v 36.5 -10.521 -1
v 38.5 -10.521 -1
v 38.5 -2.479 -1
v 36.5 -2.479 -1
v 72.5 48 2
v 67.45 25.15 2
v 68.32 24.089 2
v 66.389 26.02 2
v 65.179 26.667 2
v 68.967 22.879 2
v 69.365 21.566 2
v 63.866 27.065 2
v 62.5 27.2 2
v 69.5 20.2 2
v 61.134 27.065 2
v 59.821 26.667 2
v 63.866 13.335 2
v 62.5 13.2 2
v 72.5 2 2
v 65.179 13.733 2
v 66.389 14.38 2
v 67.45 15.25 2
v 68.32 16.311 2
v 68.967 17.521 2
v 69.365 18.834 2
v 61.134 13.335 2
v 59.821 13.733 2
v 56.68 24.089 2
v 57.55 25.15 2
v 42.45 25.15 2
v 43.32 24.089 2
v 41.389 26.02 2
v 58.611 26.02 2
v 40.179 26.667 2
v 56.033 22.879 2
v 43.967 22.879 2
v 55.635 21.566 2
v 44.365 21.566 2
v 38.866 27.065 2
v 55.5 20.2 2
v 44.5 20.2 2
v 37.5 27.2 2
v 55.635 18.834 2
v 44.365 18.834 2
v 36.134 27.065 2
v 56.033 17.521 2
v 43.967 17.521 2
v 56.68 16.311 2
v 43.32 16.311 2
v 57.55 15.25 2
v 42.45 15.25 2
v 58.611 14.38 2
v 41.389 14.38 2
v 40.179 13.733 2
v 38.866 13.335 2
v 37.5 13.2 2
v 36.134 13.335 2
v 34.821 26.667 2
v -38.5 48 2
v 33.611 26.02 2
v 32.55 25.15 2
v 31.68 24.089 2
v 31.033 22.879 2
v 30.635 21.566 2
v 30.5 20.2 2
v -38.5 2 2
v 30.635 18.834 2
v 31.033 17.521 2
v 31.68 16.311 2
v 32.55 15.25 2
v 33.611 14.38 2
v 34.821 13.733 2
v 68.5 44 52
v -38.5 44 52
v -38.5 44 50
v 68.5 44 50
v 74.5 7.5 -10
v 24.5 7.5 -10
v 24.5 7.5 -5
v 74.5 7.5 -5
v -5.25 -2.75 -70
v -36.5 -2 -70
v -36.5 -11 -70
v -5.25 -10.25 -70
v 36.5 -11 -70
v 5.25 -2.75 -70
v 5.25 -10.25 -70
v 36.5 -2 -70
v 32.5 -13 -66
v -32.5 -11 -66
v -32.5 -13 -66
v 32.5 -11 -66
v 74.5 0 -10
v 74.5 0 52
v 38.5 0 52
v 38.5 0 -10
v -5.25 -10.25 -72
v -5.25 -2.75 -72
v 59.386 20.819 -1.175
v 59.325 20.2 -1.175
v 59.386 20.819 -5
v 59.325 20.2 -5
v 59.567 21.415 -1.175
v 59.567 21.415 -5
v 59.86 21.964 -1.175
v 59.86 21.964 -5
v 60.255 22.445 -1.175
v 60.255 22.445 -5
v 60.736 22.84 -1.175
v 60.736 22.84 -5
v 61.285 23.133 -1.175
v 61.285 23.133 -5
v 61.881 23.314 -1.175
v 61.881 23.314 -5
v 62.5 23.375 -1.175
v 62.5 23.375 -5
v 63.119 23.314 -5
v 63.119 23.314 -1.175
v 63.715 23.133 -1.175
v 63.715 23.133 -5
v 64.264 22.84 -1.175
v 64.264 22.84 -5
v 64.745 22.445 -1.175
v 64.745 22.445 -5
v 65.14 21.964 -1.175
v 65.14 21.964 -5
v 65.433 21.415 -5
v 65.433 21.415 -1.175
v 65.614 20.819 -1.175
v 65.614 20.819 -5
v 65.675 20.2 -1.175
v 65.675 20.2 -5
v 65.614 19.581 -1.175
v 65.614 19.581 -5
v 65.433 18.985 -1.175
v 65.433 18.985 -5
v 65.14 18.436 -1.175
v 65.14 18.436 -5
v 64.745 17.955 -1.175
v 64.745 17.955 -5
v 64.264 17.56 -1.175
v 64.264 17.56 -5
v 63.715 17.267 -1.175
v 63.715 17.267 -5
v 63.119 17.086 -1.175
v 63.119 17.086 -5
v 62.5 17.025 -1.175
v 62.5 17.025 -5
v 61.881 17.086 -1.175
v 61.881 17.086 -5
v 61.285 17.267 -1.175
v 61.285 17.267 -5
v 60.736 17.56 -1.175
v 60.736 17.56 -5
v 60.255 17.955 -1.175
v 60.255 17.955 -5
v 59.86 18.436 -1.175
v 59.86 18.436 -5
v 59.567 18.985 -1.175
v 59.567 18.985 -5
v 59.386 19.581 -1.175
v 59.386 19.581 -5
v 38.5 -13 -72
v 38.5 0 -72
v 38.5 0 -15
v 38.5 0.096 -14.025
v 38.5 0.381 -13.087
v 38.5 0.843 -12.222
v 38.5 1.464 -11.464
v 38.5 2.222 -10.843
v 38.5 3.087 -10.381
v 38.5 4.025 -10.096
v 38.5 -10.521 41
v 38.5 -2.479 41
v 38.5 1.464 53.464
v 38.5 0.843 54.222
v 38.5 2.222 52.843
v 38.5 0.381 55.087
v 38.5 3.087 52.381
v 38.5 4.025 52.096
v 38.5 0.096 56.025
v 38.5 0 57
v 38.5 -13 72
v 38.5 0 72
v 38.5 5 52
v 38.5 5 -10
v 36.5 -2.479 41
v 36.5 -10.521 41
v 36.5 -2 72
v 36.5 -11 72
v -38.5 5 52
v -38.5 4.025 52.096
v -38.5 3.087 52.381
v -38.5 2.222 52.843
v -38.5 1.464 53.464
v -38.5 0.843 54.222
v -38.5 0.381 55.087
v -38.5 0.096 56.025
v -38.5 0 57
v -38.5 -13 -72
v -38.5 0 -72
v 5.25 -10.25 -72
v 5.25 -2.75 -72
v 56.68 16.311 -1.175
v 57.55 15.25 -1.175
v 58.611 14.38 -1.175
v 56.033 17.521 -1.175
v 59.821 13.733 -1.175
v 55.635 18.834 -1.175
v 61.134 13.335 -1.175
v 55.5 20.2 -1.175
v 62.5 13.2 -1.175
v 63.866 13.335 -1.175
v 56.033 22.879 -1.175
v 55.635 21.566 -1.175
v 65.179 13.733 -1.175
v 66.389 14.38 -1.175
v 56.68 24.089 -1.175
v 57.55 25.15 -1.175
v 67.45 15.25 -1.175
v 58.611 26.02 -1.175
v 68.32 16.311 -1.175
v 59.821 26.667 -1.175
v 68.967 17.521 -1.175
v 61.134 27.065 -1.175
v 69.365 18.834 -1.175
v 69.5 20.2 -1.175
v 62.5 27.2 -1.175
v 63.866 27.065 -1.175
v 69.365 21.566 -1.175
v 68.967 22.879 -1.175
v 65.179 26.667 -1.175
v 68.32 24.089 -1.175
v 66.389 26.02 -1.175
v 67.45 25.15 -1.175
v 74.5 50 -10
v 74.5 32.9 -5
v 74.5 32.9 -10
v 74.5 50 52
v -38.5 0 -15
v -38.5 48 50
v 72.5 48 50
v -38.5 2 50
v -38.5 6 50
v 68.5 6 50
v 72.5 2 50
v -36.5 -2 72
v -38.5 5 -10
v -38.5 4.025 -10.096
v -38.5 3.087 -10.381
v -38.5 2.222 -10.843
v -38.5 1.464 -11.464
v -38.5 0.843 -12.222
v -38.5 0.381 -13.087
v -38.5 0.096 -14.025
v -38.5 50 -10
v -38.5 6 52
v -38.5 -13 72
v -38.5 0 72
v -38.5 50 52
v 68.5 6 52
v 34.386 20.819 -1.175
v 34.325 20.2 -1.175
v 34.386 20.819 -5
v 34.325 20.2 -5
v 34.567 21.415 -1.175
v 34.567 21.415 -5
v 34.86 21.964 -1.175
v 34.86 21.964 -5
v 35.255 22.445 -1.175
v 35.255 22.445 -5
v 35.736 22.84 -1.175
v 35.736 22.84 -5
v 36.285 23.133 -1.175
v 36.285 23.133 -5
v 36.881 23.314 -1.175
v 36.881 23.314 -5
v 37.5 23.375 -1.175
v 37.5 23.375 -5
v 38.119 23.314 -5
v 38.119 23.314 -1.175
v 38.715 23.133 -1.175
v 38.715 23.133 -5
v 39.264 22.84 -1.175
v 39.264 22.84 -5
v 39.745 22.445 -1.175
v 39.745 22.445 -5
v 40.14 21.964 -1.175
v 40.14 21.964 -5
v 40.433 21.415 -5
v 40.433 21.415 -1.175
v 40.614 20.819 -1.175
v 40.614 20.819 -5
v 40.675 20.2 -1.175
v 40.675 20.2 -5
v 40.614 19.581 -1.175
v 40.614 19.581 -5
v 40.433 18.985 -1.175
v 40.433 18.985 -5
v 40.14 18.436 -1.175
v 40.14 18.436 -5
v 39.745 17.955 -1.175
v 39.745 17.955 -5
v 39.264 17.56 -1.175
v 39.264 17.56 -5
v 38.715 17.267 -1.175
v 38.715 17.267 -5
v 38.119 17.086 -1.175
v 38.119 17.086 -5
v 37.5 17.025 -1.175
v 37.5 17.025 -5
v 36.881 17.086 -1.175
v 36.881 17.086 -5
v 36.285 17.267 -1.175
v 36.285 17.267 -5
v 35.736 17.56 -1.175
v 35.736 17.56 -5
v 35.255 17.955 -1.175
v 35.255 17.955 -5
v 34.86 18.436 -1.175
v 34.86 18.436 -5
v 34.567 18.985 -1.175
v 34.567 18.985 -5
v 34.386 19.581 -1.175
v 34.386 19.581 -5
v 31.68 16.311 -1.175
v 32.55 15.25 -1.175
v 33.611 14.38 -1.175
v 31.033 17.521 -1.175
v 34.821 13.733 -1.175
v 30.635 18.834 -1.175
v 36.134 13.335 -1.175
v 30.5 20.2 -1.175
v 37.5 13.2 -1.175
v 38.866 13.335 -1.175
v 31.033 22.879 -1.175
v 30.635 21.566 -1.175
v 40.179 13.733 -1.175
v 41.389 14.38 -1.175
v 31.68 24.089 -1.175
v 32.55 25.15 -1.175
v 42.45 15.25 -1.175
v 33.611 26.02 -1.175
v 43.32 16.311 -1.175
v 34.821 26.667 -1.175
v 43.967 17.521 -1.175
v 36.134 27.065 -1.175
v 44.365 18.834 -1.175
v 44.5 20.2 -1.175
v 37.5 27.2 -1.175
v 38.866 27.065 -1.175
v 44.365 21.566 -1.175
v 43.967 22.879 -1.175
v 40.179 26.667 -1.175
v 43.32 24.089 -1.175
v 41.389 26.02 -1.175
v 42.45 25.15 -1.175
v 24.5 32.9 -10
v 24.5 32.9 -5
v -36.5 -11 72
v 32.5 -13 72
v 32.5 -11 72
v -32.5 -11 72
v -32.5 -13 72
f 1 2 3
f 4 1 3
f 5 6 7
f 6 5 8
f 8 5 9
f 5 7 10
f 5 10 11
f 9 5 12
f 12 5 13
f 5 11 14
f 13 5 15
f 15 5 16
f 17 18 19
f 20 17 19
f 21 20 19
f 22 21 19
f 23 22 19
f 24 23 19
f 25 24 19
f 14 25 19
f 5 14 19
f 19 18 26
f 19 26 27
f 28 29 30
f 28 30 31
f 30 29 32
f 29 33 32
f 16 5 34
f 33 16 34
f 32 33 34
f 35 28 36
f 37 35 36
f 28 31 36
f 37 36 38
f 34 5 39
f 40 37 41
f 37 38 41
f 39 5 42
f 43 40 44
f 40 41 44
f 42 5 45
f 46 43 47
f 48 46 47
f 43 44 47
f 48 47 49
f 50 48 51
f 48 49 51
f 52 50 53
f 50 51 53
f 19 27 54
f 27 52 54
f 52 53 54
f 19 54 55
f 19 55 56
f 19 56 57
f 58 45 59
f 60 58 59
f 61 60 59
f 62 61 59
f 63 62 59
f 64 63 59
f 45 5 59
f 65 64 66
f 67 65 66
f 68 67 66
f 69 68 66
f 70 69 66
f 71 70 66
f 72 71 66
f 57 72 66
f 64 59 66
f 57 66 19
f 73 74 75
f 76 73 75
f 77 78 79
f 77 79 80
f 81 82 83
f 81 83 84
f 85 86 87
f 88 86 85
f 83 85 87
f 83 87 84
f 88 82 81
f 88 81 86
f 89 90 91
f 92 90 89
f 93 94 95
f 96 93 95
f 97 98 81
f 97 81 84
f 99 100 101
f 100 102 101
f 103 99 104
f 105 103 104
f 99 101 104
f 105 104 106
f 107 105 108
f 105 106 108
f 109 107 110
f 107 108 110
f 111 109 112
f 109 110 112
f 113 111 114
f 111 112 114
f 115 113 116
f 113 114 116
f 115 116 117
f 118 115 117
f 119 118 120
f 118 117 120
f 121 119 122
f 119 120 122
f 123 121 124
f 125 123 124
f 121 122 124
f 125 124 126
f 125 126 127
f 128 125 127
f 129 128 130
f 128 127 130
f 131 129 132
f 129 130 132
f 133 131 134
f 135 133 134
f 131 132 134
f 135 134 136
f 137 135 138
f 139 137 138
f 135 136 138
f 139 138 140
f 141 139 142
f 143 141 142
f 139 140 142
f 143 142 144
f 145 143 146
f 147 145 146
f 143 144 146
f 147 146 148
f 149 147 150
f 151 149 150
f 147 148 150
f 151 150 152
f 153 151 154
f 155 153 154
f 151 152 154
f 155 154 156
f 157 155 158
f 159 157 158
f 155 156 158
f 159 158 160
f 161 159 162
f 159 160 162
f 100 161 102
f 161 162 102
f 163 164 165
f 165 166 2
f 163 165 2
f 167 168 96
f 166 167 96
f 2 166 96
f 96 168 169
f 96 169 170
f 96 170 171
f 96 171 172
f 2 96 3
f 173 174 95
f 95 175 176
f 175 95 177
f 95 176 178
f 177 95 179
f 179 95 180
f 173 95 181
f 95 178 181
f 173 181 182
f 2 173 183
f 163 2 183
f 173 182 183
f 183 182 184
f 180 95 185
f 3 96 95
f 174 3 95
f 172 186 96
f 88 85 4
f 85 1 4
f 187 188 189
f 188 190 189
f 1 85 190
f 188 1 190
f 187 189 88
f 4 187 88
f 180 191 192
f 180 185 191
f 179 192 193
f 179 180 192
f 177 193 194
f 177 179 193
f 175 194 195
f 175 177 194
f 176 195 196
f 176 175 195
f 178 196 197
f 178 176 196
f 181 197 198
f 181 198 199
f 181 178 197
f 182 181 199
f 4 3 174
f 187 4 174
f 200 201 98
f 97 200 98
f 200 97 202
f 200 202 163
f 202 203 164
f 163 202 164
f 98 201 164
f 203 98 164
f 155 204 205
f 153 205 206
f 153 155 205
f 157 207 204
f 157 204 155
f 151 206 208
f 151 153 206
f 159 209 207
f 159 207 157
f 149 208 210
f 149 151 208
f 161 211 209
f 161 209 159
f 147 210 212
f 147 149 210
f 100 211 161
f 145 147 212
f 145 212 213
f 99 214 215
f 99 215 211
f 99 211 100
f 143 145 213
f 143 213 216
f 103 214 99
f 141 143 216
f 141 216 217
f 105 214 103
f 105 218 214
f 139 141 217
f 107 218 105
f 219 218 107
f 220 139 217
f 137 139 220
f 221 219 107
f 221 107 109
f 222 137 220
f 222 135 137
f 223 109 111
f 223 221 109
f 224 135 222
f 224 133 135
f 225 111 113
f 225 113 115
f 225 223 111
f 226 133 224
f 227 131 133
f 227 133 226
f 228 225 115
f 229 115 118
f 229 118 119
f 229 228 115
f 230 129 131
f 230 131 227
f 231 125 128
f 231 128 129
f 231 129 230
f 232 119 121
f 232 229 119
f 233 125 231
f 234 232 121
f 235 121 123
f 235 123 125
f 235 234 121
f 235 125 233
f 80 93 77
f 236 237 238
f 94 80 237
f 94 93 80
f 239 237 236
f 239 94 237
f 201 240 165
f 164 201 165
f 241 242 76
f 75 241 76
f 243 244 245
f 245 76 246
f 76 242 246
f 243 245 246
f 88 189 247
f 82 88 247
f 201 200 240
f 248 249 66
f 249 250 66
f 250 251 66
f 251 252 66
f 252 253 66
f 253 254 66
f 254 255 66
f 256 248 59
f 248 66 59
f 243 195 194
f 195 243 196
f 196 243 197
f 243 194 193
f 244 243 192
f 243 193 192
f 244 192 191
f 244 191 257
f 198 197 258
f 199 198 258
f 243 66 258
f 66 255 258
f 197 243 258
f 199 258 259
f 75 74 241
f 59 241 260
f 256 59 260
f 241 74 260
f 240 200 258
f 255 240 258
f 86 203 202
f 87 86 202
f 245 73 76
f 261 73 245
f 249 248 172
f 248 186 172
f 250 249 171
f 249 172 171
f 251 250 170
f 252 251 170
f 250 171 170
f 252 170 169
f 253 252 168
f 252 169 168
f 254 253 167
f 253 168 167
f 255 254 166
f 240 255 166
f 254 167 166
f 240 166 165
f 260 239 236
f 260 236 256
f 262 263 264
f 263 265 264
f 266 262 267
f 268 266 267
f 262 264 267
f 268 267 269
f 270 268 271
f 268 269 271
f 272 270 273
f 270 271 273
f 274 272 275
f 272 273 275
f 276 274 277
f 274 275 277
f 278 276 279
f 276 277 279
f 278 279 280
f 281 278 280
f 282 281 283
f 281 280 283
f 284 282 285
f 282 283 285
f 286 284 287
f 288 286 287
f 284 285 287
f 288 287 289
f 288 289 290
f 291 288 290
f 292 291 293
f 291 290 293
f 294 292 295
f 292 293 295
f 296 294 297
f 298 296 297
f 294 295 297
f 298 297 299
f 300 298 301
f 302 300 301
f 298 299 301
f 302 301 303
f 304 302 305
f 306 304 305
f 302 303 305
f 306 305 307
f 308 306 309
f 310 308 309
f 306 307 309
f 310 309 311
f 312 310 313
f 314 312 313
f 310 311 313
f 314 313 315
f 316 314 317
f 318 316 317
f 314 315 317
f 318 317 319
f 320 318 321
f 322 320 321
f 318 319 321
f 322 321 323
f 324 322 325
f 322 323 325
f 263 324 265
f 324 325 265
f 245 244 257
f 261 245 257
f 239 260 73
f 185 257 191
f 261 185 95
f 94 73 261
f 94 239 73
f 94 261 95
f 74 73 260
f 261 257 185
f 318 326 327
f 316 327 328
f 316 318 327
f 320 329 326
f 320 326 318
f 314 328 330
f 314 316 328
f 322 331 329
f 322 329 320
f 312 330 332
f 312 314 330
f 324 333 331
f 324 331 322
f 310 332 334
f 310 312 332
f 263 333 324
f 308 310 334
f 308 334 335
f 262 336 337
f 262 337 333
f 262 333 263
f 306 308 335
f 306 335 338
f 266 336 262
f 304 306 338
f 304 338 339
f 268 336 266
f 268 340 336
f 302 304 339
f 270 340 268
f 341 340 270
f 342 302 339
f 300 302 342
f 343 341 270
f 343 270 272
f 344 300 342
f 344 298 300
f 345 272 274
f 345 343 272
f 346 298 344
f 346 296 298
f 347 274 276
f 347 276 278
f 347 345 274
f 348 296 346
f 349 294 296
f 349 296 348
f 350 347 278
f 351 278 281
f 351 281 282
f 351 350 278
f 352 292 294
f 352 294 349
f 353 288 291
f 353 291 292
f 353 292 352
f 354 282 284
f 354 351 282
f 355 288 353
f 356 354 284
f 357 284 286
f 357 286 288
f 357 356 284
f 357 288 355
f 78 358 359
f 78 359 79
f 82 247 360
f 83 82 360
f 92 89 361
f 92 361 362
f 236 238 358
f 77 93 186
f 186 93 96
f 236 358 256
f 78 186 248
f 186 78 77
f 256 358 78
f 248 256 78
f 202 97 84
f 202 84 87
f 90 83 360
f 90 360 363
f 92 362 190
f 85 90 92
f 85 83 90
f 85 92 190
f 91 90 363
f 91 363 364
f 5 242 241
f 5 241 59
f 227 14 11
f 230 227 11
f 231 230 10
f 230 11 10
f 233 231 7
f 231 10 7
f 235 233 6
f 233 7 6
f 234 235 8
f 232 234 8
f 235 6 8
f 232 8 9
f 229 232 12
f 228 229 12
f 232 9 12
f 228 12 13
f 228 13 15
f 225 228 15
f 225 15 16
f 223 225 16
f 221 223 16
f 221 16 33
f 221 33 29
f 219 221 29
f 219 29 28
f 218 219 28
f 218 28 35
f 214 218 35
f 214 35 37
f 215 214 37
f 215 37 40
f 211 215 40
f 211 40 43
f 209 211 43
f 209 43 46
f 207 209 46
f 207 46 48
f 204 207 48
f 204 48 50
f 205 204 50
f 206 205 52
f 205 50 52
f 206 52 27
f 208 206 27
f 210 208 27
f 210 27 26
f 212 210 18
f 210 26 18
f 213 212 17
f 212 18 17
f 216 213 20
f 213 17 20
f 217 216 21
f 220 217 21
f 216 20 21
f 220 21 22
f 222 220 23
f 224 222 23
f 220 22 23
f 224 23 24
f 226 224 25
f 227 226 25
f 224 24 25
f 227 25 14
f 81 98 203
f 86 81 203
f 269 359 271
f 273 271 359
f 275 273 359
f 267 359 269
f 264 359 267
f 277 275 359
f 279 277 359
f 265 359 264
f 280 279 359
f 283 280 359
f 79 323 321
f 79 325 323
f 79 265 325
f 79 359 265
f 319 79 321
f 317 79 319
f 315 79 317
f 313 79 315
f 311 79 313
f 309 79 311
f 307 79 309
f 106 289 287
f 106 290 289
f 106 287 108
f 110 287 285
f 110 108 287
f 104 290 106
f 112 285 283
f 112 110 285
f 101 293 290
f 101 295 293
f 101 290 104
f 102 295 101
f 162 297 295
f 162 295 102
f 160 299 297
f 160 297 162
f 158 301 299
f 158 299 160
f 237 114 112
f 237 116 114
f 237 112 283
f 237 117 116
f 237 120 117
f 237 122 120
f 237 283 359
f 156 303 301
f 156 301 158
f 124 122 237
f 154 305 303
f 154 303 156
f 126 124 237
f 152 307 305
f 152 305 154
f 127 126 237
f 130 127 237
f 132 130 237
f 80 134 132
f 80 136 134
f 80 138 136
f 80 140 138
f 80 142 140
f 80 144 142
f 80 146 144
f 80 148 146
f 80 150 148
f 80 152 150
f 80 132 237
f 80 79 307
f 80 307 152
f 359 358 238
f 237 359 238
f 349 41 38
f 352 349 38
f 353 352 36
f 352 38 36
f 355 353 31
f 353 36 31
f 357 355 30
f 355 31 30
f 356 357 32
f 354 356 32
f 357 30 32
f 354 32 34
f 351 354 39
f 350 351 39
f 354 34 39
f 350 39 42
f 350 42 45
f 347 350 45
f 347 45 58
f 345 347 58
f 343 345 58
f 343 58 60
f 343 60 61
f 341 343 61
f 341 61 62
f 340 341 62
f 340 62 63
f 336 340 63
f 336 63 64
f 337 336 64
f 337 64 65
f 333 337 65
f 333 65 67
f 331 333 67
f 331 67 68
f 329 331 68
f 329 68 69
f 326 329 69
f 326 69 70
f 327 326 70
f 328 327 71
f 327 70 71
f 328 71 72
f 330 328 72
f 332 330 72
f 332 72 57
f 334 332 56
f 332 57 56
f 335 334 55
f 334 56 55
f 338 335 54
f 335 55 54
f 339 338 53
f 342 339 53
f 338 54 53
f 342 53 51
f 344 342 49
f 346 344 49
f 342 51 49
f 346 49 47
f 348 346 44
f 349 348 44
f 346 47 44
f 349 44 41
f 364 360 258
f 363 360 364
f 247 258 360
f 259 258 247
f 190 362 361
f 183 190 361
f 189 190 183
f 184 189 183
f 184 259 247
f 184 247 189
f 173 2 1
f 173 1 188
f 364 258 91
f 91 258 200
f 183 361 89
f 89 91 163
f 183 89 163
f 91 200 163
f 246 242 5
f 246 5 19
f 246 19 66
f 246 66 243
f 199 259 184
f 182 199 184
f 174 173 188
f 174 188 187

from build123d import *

# Parameters (mm, degrees)
F0_W            = 77
F0_H            = 144
F1_DEPTH        = 13
F3_DEPTH        = 142
F4_W            = 65
F4_H            = 2
F5_DEPTH        = 4
F6_W            = 10.5
F6_H            = 7.5
F7_DEPTH        = 25
F8_W            = 8.0420786627
F8_H            = 42
F9_DEPTH        = 25
F10_W           = 77
F10_H           = 54
F10_W_2         = 36
F11_DEPTH       = 50
F13_DEPTH       = 111
F14_W           = 38
F14_H           = 2
F15_DEPTH       = 4
F16_DEPTH       = 8
F17_W           = 50
F17_H           = 25.4
F18_DEPTH       = 5
F20_D           = 6.35
F20_DEPTH       = 8
F20_CBORE_D     = 14
F20_CBORE_DEPTH = 3.175
F20_TIP         = 1.9077324654
F21_R           = 5


with BuildPart() as f1:
    # F0 (on Front) → F1 (new body)
    with BuildSketch(Plane.XZ):
        Rectangle(F0_W, F0_H)
    extrude(amount=F1_DEPTH)

    # F2 (on face) → F3 (cut)
    with BuildSketch(Plane.XY.offset(72)):
        Polygon((-32.5, -11), (-32.5, -13), (32.5, -13), (32.5, -11), (36.5, -11), (36.5, -2), (-36.5, -2), (-36.5, -11), align=None)
    extrude(amount=-F3_DEPTH, mode=Mode.SUBTRACT)

    # F4 (on face) → F5 (join)
    with BuildSketch(Plane.XY.offset(-70)):
        with Locations((0, -12)):
            Rectangle(F4_W, F4_H)
    extrude(amount=F5_DEPTH)

    # F6 (on face) → F7 (cut)
    with BuildSketch(Plane(origin=(0, 0, -72), x_dir=(1, 0, 0), z_dir=(0, 0, -1))):
        with Locations((0, 6.5)):
            Rectangle(F6_W, F6_H)
    extrude(amount=-F7_DEPTH, mode=Mode.SUBTRACT)

    # F8 (on face) → F9 (cut)
    with BuildSketch(Plane.YZ.offset(38.5)):
        with Locations((-6.5, 20)):
            Rectangle(F8_W, F8_H)
    extrude(amount=-F9_DEPTH, mode=Mode.SUBTRACT)

    # F10 (on face) → F11 (join)
    with BuildSketch(Plane(origin=(0, 0, 0), x_dir=(-1, 0, 0), z_dir=(0, 1, 0))):
        with Locations((0, 25)):
            Rectangle(F10_W, F10_H)
        with Locations((-56.5, 25)):
            Rectangle(F10_W_2, F10_H)
    extrude(amount=F11_DEPTH)

    # F12 (on face) → F13 (cut)
    with BuildSketch(Plane(origin=(-38.5, 0, 0), x_dir=(0, -1, 0), z_dir=(-1, 0, 0))):
        Polygon((-6, 50), (-6, 52), (-44, 52), (-44, 50), (-48, 50), (-48, 2), (-2, 2), (-2, 50), align=None)
    extrude(amount=-F13_DEPTH, mode=Mode.SUBTRACT)

    # F14 (on face) → F15 (join)
    with BuildSketch(Plane(origin=(72.5, 0, 0), x_dir=(0, -1, 0), z_dir=(-1, 0, 0))):
        with Locations((-25, 51)):
            Rectangle(F14_W, F14_H)
    extrude(amount=F15_DEPTH)

    # F16 (add): a face of the model
    f16_faces = [f1.faces().sort_by_distance(p)[0] for p in [
        (18, 25, -2),
    ]]
    extrude(f16_faces, amount=F16_DEPTH)

    # F17 (on face) → F18 (cut)
    with BuildSketch(Plane(origin=(0, 0, -10), x_dir=(1, 0, 0), z_dir=(0, 0, -1))):
        with Locations((49.5, -20.2)):
            Rectangle(F17_W, F17_H)
    extrude(amount=-F18_DEPTH, mode=Mode.SUBTRACT)

    # F20
    with Locations(Plane.XY.offset(2)):
        with Locations((62.5, 20.2), (37.5, 20.2)):
            CounterBoreHole(F20_D / 2, F20_CBORE_D / 2, F20_CBORE_DEPTH, depth=F20_DEPTH)
            with Locations((0, 0, -(F20_DEPTH + F20_TIP / 2))):  # 118° drill point
                Cone(0, F20_D / 2, F20_TIP, mode=Mode.SUBTRACT)

    # F21
    f21_edges = [f1.edges().sort_by_distance(p)[0] for p in [
        (0, 0, -10),
        (0, 0, 52),
    ]]
    fillet(f21_edges, radius=F21_R)


solid = f1.part
